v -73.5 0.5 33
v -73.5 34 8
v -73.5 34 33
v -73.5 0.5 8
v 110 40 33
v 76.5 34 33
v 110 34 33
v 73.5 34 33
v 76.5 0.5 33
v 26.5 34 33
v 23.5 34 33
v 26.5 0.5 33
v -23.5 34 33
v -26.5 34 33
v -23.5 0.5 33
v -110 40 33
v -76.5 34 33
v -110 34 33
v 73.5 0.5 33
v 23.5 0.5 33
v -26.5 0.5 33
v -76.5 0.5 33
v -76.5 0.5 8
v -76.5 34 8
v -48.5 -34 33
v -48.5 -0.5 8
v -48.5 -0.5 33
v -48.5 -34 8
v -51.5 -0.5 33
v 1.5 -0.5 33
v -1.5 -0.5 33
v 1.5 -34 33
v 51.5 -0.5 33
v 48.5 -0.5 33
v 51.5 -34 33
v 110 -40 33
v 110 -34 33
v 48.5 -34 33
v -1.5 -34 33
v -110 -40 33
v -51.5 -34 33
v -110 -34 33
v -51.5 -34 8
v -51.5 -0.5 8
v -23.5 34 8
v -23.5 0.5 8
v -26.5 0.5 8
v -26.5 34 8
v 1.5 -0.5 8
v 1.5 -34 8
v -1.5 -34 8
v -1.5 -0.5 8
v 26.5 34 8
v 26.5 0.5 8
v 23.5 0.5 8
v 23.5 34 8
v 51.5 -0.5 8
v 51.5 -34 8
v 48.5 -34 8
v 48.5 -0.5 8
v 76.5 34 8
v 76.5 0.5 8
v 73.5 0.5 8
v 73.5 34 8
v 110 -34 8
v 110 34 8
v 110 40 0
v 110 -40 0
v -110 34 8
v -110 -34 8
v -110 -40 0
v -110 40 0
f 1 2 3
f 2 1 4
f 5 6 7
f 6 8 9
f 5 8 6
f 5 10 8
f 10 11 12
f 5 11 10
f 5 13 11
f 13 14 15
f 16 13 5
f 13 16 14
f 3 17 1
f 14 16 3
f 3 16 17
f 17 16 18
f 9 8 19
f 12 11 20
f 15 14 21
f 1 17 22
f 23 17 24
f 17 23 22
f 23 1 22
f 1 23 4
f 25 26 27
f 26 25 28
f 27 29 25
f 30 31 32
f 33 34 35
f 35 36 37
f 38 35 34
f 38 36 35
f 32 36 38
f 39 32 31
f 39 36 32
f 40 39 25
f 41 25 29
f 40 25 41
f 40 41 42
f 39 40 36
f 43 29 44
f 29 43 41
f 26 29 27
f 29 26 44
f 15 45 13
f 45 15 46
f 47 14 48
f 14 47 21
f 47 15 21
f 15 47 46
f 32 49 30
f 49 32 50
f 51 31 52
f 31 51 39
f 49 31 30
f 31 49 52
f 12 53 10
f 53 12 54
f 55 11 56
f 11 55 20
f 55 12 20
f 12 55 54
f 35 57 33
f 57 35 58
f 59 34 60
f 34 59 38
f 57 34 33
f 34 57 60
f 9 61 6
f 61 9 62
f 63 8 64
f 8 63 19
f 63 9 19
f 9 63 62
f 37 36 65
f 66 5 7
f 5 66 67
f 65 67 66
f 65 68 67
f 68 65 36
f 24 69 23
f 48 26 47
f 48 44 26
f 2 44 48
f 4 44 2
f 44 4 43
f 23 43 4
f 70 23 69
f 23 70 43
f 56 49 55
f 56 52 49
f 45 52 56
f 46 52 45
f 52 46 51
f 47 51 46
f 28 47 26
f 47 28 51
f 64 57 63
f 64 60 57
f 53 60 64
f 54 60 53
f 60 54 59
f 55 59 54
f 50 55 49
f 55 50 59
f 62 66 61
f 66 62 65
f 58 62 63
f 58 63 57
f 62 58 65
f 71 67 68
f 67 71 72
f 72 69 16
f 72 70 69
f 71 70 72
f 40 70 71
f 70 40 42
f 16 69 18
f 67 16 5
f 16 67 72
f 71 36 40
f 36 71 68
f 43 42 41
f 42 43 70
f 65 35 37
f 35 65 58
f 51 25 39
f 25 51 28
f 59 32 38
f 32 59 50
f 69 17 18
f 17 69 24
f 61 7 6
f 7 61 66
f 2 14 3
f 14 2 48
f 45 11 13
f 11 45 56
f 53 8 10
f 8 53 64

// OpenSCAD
$fn = 32;

// ----------------------------------------------------------------------
// Rib frame 220 x 80 x 33
// 7 ribs at 25 mm pitch, staggered
// ----------------------------------------------------------------------

// --- parameters (mm) ---
frame = [220, 80, 8];  // base plate size (x, y, z)
rail_w = 6;            // side rail width
ribs = 7;              // number of ribs
rib_t = 3;             // rib thickness
rib_h = 25;            // rib height above the base plate
pitch = 25;            // pitch between rib centres

// --- derived feature positions (mm) ---
span = (ribs - 1) * pitch;          // = 150   distance between the outer ribs
origin_x = -span / 2;               // = -75   X of the first rib
rib_len = frame[1] / 2 - rail_w + 0.5;  // = 34.5   length of a staggered rib
rib_y = 0.5 + rib_len / 2;          // = 17.75   Y of a staggered rib centre
row_offset = 2 * rib_y;             // = 35.5   distance between the two rows
feature_centers = [
  [origin_x + 0 * pitch, rib_y],
  [origin_x + 1 * pitch, -rib_y],
  [origin_x + 2 * pitch, rib_y],
  [origin_x + 3 * pitch, -rib_y],
  [origin_x + 4 * pitch, rib_y],
  [origin_x + 5 * pitch, -rib_y],
  [origin_x + 6 * pitch, rib_y]
];   // rib centre line, drives the rib loop

// base plate, two side rails, then the ribs read straight off feature_centers
union() {
  translate([-frame[0] / 2, -frame[1] / 2, 0]) cube(frame);
  translate([-frame[0] / 2, -frame[1] / 2, 0]) cube([frame[0], rail_w, frame[2] + rib_h]);
  translate([-frame[0] / 2, frame[1] / 2 - rail_w, 0]) cube([frame[0], rail_w, frame[2] + rib_h]);
  for (centre = feature_centers)
    translate([centre[0] - rib_t / 2, centre[1] - rib_len / 2, frame[2] - 1])
      cube([rib_t, rib_len, rib_h + 1]);
}
